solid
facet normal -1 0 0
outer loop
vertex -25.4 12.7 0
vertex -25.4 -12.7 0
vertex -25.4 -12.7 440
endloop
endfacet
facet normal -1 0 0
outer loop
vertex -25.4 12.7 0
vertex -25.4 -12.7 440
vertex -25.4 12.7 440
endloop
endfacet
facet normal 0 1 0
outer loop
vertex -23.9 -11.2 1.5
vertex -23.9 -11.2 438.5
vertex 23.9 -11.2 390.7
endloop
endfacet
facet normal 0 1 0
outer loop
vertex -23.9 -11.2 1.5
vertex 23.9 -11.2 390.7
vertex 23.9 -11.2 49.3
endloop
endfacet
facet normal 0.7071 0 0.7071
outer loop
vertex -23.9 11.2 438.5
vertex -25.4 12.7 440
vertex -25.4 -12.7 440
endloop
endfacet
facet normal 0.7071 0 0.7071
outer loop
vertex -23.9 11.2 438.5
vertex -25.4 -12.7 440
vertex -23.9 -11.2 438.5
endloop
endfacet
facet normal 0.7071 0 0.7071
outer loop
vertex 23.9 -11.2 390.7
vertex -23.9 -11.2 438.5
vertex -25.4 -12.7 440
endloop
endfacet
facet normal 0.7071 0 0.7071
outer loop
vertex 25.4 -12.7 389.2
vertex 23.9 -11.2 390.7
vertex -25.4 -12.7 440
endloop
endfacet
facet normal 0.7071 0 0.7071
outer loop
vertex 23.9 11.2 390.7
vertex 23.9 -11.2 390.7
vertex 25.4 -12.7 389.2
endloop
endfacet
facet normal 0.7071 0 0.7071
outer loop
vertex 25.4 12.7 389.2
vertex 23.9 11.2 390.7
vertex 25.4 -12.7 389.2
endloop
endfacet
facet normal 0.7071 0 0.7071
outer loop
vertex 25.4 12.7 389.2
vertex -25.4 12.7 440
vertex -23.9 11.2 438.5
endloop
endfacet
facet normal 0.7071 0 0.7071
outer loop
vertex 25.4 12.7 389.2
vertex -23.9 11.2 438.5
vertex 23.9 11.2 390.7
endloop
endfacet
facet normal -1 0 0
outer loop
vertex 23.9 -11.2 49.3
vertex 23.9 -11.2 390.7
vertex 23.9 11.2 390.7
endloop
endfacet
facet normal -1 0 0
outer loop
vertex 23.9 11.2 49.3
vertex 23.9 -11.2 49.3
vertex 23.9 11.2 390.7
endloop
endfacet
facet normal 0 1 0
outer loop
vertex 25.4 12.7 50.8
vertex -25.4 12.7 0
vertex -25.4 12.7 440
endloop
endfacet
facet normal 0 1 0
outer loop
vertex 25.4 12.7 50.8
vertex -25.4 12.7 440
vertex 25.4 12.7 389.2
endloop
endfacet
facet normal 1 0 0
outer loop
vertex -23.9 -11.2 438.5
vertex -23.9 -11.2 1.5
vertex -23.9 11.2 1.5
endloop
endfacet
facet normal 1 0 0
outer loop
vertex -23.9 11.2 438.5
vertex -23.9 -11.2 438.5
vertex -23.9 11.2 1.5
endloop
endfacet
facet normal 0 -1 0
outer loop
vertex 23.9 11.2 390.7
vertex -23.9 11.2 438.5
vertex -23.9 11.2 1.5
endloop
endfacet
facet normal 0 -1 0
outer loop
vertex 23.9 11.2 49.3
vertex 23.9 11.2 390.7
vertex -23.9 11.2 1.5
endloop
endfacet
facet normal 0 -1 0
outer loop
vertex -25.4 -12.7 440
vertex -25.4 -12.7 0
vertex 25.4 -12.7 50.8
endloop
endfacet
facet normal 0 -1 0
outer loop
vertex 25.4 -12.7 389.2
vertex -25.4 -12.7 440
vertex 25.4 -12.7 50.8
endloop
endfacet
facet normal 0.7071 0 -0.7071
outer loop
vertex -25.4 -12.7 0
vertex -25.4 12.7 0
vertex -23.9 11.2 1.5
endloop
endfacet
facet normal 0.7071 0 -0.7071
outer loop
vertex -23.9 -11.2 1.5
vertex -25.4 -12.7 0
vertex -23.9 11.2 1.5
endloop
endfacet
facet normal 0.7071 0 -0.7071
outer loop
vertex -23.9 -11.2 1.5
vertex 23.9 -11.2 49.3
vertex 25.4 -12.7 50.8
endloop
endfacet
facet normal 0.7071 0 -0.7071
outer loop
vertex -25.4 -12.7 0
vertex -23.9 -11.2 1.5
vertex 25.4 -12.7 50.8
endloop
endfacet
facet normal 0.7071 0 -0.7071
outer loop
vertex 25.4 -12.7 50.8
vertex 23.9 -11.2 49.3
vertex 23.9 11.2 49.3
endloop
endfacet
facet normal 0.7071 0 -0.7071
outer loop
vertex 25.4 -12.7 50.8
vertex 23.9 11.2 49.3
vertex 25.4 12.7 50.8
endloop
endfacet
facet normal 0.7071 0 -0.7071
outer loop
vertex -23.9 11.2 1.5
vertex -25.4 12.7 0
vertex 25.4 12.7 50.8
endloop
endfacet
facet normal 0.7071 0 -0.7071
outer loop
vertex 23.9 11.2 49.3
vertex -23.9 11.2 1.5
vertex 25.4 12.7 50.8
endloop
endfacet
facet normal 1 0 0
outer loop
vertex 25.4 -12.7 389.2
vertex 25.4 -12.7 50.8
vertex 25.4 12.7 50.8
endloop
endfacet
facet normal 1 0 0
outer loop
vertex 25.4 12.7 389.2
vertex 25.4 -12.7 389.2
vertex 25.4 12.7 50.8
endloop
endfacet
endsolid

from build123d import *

# Parameters (mm, degrees)
CROQUIS1_W              = 50.8
CROQUIS1_H              = 25.4
CROQUIS1_W_2            = 47.8
CROQUIS1_H_2            = 22.4
SALIENTE_EXTRUIR1_DEPTH = 440
CORTAR_EXTRUIR1_DEPTH   = 26


with BuildPart() as part:
    # Croquis1 → Saliente-Extruir1 (new body)
    with BuildSketch(Plane.XY):
        Rectangle(CROQUIS1_W, CROQUIS1_H)
        Rectangle(CROQUIS1_W_2, CROQUIS1_H_2, mode=Mode.SUBTRACT)
    extrude(amount=SALIENTE_EXTRUIR1_DEPTH)

    # Croquis2 → Cortar-Extruir1 (cut)
    with BuildSketch(Plane(origin=(0, 12.7, 0), x_dir=(1, 0, 0), z_dir=(0, 1, 0))):
        Polygon((-25.4, 0), (25.4, -50.8), (25.4, 0), align=None)
        Polygon((25.4, -389.2), (25.4, -440), (-25.4, -440), align=None)
    extrude(amount=-CORTAR_EXTRUIR1_DEPTH, mode=Mode.SUBTRACT)


solid = part.part
